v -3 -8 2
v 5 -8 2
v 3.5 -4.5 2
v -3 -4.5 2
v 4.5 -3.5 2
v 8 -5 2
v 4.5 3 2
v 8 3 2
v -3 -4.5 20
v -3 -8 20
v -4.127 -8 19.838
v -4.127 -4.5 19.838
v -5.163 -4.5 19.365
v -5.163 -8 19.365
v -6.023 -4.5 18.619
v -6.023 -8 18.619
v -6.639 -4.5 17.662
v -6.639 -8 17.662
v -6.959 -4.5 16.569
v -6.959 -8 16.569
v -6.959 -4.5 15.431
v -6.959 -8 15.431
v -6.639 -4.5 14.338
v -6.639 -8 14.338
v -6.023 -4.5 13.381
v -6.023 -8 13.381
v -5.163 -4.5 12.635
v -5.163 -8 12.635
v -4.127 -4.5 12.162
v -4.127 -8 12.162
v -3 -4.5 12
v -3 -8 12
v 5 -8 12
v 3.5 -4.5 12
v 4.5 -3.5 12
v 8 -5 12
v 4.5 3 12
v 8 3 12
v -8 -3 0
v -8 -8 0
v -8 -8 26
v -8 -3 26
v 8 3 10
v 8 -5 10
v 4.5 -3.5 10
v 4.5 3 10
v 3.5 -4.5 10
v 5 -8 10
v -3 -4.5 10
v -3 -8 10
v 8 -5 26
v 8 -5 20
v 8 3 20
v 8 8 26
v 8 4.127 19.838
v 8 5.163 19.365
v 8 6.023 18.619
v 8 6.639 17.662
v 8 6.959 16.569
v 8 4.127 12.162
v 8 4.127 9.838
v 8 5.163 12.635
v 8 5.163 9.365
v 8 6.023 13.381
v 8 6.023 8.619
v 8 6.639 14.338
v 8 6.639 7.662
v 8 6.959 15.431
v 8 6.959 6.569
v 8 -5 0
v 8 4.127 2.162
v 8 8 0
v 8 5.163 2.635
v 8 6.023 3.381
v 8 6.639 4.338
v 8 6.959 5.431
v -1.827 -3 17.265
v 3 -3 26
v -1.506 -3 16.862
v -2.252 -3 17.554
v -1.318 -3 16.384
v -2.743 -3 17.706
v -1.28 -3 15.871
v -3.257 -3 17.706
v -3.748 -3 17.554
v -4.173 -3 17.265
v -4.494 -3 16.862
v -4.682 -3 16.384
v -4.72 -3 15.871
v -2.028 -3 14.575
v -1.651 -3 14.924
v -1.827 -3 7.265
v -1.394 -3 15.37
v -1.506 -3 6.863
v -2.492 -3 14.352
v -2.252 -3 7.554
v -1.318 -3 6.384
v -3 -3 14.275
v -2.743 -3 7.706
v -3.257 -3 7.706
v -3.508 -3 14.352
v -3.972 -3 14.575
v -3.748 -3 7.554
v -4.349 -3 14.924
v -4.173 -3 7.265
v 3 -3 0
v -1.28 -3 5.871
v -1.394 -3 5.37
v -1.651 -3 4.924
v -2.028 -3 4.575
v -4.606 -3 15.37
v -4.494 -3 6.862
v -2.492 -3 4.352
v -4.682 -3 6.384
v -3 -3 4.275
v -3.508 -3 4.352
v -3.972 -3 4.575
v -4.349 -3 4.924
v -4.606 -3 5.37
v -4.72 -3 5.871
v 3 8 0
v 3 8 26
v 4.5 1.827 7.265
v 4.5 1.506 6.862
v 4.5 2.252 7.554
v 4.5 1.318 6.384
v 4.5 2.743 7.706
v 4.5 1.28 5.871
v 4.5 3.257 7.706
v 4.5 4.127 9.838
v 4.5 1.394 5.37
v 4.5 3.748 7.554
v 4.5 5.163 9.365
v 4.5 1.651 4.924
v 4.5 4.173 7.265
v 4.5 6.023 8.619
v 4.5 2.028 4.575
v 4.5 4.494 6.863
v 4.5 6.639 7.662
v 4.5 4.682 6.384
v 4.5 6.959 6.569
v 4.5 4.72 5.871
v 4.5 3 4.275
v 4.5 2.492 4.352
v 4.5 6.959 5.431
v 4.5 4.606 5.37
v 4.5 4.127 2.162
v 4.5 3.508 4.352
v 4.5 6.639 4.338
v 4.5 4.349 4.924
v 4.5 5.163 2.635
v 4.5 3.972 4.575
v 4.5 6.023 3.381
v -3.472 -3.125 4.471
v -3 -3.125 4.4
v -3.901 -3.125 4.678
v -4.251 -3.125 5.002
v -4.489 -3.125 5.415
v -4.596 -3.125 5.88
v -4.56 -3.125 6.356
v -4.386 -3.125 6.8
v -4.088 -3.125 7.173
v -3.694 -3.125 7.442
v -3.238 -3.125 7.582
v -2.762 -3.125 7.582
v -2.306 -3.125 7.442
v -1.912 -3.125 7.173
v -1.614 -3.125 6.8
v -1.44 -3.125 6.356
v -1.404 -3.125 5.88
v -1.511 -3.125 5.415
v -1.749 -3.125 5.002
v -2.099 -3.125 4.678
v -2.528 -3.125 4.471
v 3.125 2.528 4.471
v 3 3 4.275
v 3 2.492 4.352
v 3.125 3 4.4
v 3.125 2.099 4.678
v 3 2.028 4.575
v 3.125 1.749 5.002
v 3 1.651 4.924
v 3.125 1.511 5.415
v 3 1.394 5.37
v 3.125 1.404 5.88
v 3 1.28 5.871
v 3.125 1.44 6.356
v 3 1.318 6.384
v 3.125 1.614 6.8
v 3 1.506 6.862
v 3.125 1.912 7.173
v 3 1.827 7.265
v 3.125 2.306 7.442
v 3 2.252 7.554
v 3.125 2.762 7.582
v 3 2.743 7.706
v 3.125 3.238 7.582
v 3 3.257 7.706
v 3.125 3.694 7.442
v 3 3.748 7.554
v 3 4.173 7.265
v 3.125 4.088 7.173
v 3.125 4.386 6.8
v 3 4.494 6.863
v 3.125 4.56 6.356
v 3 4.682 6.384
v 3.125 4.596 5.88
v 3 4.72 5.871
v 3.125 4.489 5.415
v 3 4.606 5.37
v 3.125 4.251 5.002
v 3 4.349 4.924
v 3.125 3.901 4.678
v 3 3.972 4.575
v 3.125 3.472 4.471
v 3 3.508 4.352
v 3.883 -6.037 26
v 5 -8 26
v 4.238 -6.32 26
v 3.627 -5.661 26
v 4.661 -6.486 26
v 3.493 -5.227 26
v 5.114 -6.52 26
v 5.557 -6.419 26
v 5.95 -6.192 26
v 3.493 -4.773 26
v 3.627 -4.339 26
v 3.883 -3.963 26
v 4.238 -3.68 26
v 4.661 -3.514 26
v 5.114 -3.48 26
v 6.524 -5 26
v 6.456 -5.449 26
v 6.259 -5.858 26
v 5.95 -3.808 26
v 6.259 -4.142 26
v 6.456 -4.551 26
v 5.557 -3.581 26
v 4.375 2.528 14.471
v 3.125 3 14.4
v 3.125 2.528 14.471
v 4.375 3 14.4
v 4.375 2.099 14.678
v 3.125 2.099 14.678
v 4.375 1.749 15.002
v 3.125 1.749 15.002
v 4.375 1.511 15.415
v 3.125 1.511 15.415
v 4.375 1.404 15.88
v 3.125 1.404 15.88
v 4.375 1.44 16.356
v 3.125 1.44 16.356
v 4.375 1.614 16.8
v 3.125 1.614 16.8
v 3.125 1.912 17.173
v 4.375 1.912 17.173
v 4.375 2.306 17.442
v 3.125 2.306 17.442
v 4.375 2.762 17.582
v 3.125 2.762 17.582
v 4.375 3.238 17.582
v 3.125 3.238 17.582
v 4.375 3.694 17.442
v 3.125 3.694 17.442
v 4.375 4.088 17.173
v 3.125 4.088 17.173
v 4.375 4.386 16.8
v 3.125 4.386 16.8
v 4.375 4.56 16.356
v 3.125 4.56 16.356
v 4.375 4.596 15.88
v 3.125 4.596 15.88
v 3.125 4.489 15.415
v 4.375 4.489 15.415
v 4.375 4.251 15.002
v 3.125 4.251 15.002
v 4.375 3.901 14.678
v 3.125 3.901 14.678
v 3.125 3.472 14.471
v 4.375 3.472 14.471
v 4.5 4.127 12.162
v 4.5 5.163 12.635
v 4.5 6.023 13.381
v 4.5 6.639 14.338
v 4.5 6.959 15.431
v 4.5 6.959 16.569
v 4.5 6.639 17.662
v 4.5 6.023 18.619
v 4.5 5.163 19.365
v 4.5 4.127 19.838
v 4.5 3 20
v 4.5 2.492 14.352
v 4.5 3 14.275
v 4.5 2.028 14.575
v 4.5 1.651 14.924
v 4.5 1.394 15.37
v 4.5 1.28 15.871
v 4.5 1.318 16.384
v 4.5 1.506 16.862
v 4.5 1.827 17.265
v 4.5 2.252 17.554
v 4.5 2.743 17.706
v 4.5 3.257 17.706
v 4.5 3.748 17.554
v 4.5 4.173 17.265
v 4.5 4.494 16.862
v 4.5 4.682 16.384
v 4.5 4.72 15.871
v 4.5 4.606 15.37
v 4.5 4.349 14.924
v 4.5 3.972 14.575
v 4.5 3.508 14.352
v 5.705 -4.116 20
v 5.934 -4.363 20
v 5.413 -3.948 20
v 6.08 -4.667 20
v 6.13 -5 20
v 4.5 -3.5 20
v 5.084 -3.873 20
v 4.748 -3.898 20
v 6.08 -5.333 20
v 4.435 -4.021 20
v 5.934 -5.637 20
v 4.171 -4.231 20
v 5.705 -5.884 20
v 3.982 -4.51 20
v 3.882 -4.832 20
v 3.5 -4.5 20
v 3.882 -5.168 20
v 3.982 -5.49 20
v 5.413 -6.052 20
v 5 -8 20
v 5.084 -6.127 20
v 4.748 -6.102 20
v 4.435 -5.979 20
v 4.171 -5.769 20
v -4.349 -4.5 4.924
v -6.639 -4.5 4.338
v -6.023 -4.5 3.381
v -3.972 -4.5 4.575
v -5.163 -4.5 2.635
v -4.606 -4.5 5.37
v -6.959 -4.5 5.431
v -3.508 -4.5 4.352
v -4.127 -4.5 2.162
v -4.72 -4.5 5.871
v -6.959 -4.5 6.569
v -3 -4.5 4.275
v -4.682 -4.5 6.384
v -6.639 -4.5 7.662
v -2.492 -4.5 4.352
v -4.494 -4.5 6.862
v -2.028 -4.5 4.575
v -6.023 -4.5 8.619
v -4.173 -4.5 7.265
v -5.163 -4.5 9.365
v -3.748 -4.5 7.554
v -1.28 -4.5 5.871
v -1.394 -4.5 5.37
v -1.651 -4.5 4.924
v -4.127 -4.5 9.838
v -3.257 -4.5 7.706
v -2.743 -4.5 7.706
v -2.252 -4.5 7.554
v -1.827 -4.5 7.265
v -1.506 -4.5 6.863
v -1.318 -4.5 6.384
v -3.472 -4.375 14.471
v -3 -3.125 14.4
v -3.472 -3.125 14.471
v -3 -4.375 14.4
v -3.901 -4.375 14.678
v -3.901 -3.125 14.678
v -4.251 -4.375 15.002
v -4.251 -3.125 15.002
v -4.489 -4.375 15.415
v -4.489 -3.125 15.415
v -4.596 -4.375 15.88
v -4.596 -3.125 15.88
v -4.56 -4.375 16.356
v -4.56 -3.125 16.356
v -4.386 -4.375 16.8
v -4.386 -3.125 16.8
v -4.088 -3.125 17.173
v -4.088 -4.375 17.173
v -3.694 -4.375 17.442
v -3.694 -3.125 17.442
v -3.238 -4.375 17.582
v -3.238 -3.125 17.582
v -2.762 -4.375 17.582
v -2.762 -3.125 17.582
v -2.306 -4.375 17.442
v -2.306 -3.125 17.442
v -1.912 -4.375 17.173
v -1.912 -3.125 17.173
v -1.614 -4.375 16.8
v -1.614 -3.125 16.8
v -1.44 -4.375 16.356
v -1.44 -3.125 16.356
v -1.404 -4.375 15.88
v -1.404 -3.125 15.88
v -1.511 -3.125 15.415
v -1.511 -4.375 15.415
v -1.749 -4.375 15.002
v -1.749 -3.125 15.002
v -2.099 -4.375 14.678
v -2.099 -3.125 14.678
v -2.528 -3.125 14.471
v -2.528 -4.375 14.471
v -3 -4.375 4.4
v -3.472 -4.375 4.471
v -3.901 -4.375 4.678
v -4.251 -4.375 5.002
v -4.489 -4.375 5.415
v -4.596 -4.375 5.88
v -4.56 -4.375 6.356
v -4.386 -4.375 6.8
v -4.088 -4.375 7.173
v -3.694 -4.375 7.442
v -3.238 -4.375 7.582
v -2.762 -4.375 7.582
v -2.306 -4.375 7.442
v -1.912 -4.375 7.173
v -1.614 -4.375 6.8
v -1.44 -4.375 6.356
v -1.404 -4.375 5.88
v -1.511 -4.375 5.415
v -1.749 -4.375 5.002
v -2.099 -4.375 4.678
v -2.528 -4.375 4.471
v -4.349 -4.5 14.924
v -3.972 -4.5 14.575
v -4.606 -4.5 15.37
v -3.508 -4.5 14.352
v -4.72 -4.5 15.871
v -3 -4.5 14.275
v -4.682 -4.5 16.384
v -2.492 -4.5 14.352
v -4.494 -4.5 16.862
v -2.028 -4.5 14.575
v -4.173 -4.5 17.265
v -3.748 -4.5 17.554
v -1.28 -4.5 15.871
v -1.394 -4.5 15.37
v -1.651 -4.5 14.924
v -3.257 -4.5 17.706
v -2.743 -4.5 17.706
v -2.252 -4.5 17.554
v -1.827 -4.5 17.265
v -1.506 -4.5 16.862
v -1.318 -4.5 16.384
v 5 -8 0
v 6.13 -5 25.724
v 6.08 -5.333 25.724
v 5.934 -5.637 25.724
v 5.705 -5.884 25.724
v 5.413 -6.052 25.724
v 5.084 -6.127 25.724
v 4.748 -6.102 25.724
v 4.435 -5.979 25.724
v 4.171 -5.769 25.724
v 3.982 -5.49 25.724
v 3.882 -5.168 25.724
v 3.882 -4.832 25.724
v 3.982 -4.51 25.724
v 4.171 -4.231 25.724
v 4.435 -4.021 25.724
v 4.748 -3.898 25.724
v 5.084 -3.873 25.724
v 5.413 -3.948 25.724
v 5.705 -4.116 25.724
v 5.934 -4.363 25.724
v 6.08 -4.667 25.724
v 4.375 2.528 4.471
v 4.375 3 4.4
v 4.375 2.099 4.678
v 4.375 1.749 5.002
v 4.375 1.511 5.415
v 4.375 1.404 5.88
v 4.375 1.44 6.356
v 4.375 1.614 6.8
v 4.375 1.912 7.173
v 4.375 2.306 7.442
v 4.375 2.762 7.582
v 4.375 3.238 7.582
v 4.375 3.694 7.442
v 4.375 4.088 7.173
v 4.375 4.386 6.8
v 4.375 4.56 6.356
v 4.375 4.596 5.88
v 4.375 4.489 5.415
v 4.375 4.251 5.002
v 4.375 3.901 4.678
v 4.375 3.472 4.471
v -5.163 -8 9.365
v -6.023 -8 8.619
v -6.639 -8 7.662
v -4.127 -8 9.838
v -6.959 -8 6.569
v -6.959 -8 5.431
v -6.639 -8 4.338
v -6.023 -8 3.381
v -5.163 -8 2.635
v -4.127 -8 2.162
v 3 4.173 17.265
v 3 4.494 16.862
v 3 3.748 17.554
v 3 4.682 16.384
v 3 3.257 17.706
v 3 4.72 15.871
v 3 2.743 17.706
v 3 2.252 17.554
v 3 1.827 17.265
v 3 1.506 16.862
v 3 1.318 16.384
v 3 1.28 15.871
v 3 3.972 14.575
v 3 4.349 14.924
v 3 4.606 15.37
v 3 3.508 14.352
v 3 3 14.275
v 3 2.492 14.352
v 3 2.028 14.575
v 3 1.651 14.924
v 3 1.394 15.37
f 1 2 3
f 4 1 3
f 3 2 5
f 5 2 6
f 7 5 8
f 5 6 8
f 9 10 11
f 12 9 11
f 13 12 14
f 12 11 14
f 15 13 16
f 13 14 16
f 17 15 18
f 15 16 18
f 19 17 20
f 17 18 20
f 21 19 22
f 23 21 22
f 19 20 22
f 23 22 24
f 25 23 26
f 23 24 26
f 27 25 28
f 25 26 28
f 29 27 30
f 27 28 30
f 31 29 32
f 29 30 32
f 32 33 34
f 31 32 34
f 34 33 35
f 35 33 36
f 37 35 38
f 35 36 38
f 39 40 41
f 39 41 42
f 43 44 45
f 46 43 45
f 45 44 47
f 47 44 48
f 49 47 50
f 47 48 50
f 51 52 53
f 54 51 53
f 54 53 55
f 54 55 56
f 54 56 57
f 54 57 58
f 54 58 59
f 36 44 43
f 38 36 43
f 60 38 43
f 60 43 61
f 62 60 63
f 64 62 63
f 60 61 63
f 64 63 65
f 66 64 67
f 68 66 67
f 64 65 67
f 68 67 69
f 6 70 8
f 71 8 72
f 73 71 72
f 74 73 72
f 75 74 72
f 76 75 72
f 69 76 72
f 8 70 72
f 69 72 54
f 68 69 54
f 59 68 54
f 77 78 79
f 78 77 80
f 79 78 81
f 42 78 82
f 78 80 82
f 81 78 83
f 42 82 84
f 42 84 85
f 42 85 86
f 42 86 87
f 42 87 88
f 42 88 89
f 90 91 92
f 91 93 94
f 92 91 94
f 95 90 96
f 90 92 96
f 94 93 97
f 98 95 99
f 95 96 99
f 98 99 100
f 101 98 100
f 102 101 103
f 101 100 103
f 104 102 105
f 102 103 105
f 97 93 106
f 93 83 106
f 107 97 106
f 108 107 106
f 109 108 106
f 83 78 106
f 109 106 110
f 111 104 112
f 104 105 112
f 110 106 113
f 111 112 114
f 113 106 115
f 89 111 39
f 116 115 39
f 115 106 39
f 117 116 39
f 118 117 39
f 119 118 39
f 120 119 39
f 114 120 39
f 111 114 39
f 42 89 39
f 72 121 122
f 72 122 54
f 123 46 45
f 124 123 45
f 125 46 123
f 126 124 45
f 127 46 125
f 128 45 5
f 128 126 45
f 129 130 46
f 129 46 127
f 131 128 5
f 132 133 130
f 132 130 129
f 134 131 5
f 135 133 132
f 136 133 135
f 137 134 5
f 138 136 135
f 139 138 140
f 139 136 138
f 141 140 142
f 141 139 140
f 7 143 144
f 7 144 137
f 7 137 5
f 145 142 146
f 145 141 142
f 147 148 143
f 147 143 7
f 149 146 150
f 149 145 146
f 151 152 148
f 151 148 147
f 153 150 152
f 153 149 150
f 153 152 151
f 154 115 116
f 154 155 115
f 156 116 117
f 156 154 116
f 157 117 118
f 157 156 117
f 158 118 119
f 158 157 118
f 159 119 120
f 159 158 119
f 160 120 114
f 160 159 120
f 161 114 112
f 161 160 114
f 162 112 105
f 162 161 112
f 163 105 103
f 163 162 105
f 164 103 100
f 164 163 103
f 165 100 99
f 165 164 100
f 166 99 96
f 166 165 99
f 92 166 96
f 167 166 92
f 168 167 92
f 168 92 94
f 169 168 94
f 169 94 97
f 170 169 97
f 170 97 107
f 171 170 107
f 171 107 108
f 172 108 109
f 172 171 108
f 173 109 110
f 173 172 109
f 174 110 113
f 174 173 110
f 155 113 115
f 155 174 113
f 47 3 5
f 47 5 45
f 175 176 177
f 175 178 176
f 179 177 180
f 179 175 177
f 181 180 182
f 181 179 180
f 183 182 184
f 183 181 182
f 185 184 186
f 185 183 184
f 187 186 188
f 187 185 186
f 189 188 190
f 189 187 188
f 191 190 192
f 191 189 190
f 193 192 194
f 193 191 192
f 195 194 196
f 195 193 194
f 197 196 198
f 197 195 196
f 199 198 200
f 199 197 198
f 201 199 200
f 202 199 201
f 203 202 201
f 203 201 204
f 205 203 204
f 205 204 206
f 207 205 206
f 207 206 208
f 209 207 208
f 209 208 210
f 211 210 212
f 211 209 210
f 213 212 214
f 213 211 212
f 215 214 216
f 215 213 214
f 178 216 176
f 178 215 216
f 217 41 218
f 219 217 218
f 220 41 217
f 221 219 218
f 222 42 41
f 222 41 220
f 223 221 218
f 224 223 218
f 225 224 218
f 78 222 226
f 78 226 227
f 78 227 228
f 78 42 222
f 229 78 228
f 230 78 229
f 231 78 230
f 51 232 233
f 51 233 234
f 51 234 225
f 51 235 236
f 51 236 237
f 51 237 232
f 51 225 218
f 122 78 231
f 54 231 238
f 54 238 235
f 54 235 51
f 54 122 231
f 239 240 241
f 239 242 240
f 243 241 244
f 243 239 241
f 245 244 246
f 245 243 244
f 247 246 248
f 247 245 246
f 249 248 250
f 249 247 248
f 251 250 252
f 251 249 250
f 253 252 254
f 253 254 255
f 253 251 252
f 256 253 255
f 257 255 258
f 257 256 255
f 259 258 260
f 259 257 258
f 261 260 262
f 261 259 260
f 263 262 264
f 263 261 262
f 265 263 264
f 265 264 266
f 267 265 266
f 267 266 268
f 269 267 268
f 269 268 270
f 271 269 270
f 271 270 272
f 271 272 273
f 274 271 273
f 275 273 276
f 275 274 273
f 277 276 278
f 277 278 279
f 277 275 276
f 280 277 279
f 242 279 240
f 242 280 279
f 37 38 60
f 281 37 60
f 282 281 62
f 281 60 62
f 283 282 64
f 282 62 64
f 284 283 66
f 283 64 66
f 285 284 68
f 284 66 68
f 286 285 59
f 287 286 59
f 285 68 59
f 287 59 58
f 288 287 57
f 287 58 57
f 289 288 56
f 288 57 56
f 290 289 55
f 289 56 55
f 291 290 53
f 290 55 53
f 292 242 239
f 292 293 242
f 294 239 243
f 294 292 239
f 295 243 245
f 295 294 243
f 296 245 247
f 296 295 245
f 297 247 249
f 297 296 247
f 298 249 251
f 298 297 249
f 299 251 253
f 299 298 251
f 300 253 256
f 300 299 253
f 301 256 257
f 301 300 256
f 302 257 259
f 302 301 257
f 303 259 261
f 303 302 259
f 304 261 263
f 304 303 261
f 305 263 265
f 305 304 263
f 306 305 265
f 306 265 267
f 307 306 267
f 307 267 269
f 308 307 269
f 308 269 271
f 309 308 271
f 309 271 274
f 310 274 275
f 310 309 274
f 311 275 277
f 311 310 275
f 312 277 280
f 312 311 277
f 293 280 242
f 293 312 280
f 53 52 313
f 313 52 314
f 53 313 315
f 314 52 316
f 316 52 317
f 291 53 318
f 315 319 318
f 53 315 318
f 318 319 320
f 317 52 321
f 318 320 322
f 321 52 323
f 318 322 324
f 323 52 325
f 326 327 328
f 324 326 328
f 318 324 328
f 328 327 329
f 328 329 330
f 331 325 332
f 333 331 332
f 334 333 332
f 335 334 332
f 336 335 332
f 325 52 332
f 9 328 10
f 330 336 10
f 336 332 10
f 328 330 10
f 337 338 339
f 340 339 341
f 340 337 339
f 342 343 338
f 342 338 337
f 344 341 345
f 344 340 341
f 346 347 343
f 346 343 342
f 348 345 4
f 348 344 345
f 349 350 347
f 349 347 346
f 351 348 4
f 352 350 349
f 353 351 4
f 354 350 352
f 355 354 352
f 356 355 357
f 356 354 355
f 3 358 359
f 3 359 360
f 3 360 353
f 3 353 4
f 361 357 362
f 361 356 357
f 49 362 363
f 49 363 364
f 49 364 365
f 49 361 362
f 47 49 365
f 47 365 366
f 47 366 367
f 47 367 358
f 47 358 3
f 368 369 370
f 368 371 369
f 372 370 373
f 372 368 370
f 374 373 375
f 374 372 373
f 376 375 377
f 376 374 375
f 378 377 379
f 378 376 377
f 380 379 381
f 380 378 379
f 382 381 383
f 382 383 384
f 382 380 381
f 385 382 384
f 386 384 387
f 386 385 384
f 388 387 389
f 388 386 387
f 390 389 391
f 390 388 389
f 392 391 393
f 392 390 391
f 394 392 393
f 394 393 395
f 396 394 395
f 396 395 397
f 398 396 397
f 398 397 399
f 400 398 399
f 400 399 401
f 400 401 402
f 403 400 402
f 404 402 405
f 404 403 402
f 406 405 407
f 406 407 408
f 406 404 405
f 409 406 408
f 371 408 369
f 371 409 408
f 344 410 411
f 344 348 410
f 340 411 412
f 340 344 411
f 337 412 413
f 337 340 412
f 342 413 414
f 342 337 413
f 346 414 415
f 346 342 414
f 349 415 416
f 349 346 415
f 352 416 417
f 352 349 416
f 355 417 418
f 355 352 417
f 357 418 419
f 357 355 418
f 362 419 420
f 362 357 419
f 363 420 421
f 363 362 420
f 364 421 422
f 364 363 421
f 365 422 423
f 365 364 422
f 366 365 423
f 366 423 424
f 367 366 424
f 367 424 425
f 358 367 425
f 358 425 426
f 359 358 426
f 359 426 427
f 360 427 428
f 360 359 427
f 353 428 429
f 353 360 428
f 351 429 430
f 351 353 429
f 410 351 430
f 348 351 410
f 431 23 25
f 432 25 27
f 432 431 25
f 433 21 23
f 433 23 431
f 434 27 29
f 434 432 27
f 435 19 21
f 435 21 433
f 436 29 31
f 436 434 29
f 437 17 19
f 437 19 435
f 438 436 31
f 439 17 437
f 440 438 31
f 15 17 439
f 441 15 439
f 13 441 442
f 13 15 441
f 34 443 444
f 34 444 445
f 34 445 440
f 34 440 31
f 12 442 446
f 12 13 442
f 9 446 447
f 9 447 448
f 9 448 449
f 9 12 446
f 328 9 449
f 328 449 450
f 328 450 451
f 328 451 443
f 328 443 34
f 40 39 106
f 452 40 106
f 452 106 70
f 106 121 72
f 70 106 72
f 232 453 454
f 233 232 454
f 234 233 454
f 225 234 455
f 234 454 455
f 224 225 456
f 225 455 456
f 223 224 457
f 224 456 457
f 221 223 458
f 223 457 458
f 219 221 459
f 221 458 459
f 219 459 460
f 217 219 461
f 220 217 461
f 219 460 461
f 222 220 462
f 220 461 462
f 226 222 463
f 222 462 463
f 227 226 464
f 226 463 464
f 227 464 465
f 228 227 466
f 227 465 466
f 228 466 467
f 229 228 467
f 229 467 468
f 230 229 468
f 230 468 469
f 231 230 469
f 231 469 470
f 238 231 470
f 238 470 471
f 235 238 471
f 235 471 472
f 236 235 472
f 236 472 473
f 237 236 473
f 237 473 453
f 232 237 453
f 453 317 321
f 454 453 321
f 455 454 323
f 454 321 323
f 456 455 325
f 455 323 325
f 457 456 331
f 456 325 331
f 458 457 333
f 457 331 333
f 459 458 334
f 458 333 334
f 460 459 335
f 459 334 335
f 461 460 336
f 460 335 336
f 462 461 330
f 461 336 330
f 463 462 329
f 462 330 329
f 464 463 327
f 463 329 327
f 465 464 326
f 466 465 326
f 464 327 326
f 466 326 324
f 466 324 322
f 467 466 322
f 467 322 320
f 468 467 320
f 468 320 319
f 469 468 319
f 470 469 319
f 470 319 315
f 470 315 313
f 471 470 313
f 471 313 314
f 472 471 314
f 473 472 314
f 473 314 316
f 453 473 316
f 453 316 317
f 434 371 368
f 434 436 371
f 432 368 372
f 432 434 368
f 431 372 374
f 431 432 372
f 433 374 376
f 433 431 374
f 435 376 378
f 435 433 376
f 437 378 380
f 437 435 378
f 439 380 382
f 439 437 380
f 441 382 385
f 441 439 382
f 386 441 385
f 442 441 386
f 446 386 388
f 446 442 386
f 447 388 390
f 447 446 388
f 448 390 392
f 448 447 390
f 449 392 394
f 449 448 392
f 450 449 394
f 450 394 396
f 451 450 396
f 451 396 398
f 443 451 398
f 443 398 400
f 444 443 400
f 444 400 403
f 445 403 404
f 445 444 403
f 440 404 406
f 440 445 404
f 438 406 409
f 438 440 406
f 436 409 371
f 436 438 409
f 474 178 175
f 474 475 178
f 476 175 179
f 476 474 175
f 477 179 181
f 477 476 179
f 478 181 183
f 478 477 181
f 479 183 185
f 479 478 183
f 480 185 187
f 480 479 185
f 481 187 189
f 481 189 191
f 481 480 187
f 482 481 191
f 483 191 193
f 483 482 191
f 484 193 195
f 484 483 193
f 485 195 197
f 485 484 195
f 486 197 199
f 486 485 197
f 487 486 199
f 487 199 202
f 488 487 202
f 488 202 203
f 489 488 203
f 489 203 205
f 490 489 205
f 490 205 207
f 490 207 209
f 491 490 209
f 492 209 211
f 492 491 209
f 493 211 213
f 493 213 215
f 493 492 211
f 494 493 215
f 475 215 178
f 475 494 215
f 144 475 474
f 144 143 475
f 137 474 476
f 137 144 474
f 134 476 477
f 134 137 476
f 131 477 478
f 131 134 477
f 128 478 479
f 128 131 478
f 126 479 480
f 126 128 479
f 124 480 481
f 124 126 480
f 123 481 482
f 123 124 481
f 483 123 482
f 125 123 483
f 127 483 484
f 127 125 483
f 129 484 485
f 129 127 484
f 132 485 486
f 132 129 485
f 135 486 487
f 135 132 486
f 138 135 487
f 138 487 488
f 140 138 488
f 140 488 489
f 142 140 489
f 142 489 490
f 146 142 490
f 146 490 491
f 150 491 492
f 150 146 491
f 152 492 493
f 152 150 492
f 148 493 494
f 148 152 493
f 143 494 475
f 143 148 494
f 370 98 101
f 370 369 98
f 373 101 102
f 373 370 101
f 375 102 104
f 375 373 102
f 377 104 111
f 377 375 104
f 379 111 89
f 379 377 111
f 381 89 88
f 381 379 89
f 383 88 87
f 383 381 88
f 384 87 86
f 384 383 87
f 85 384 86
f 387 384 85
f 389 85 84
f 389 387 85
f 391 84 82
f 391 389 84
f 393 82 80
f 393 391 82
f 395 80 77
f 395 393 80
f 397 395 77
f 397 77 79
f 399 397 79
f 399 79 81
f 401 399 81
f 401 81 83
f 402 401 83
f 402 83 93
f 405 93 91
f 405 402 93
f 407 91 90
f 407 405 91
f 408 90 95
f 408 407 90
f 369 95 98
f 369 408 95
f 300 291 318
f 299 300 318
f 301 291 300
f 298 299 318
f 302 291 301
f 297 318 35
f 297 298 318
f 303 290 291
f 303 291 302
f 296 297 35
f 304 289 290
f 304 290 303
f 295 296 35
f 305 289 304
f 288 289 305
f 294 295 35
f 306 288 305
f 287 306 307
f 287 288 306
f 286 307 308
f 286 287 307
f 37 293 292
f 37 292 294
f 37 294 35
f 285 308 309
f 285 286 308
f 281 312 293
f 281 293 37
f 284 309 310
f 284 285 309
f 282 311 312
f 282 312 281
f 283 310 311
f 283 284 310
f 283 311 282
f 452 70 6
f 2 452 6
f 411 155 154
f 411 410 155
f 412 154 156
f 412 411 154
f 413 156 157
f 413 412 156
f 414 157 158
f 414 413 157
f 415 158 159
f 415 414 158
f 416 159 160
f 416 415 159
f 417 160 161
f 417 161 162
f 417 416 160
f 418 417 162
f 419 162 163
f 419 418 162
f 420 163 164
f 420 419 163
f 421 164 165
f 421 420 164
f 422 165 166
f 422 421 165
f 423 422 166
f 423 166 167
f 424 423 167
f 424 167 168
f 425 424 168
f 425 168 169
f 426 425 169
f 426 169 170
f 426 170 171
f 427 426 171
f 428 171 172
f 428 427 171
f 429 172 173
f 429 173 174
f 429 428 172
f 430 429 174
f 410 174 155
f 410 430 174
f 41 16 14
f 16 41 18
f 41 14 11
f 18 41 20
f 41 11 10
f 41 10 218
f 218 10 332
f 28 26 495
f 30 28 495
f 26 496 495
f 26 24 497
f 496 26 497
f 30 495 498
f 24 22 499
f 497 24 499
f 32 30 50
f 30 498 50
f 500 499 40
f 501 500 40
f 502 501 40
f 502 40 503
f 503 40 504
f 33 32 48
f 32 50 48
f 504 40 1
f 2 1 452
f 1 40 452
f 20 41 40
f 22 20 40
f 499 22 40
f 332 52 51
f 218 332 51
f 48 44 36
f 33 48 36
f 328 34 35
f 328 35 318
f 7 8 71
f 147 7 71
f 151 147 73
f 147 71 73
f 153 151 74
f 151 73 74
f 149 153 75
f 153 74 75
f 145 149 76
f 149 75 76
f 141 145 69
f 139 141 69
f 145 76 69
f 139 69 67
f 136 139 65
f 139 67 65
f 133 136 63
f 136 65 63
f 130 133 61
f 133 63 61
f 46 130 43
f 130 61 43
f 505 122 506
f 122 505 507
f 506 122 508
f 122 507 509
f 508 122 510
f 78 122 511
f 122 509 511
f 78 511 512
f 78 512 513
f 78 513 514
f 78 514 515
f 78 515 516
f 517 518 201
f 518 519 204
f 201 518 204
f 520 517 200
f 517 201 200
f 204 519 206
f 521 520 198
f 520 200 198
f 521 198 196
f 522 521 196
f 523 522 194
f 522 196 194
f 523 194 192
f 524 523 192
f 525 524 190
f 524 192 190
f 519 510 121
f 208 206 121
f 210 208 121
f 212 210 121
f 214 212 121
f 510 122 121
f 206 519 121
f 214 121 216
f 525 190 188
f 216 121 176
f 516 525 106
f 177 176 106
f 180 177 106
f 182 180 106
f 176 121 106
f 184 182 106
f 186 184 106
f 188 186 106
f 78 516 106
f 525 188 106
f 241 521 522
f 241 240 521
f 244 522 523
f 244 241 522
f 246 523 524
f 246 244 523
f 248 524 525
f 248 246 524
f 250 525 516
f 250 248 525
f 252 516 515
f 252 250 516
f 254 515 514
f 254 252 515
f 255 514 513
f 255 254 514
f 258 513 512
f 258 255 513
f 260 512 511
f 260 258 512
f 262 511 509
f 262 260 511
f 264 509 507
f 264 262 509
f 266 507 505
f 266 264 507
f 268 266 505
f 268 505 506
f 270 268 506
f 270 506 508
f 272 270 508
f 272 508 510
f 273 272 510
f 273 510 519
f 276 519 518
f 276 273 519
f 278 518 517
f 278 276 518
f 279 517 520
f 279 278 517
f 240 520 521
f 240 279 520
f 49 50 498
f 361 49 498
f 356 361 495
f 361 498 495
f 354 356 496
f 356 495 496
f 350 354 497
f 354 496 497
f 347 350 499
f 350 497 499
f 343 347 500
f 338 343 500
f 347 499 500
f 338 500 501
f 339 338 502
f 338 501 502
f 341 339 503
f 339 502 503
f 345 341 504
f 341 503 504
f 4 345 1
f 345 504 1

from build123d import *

# Parameters (mm, degrees)
SKETCH_1_W                    = 16
SKETCH_1_H                    = 16
EXTRUDE_1_DEPTH               = 26
CUT_EXTRUDE_1_DEPTH           = 29.354893758
CUT_EXTRUDE_2_DEPTH           = 3.5
CUT_EXTRUDE_3_DEPTH           = 3.5
CHAMFER_1_SIZE                = 1
HOLE_WIZARD_4_401_D           = 2.2606
HOLE_WIZARD_4_401_DEPTH       = 6
HOLE_WIZARD_4_401_CSINK_D     = 3.048
HOLE_WIZARD_4_401_CSINK_ANGLE = 110
CHAMFER_3_SIZE                = 3


with BuildPart() as part:
    # Эскиз1 → Вытянуть1 (new body)
    with BuildSketch(Plane.XY):
        Rectangle(SKETCH_1_W, SKETCH_1_H)
    extrude(amount=EXTRUDE_1_DEPTH)

    # Эскиз2 → Вырез-Вытянуть1 (cut, through all)
    with BuildSketch(Plane(origin=(0, 0, 0), x_dir=(-1, 0, 0), z_dir=(0, 0, -1))):
        Polygon((-3, 56.832975678), (-3, 8), (-3, -3), (8, -3), (56.832975678, -3), (125.893232173, 66.060256495), (66.060256495, 125.893232173), align=None)
    extrude(amount=-CUT_EXTRUDE_1_DEPTH, mode=Mode.SUBTRACT)

    # Эскиз9 → Вырез-Вытянуть2 (cut)
    with BuildSketch(Plane(origin=(8, 0, 0), x_dir=(0, 0, -1), z_dir=(1, 0, 0))):
        with BuildLine():
            Line((-20, 3), (-20, -8))
            Line((-20, -8), (-12, -8))
            Line((-12, -8), (-12, 3))
            ThreePointArc((-12, 3), (-16, 7), (-20, 3))
        make_face()
        with BuildLine():
            Line((-10, 3), (-10, -8))
            Line((-10, -8), (-2, -8))
            Line((-2, -8), (-2, 3))
            ThreePointArc((-2, 3), (-6, 7), (-10, 3))
        make_face()
    extrude(amount=-CUT_EXTRUDE_2_DEPTH, mode=Mode.SUBTRACT)

    # Эскиз10 → Вырез-Вытянуть3 (cut)
    with BuildSketch(Plane.XZ.offset(8)):
        with BuildLine():
            Line((4.5, 20), (-3, 20))
            ThreePointArc((-3, 20), (-7, 16), (-3, 12))
            Line((-3, 12), (4.5, 12))
            Line((4.5, 12), (4.5, 20))
        make_face()
        with BuildLine():
            Line((4.5, 10), (-3, 10))
            ThreePointArc((-3, 10), (-7, 6), (-3, 2))
            Line((-3, 2), (4.5, 2))
            Line((4.5, 2), (4.5, 10))
        make_face()
    extrude(amount=-CUT_EXTRUDE_3_DEPTH, mode=Mode.SUBTRACT)

    # Фаска1
    chamfer_1_edges = [part.edges().sort_by_distance(p)[0] for p in [
        (4.5, -4.5, 16),
        (4.5, -4.5, 6),
    ]]
    chamfer(chamfer_1_edges, length=CHAMFER_1_SIZE)

    # Отверстие обработанное метчиком #4-401
    with Locations(Plane(origin=(-3.054370164, -0.984217205, 26), x_dir=(-1, 0, 0), z_dir=(0, 0, 1))):
        with Locations((-8.054370164, 4.015782795)):
            CounterSinkHole(HOLE_WIZARD_4_401_D / 2, HOLE_WIZARD_4_401_CSINK_D / 2, depth=HOLE_WIZARD_4_401_DEPTH, counter_sink_angle=HOLE_WIZARD_4_401_CSINK_ANGLE)

    # Эскиз11 → Отверстие с зазором M31 (revolve, cut)
    with BuildSketch(Plane(origin=(-3, -4.5, 16), x_dir=(0, 0, -1), z_dir=(1, 0, 0))):
        Polygon((0, 0), (0, 1.5), (1.725, 1.5), (1.6, 1.375), (1.6, 0.125), (1.725, 0), align=None)
    revolve(axis=Axis((-3, -10.85, 16), (0, 1, 0)), mode=Mode.SUBTRACT)

    # Эскиз11 at point 2 (carried to point 2, square into its face) → Отверстие с зазором M31 at 2 (revolve, cut)
    with BuildSketch(Plane(origin=(-3, -4.5, 6), x_dir=(0, 0, -1), z_dir=(1, 0, 0))):
        Polygon((0, 0), (0, 1.5), (1.725, 1.5), (1.6, 1.375), (1.6, 0.125), (1.725, 0), align=None)
    revolve(axis=Axis((-3, -10.85, 6), (0, 1, 0)), mode=Mode.SUBTRACT)

    # Эскиз11 at point 3 (carried to point 3, square into its face) → Отверстие с зазором M31 at 3 (revolve, cut)
    with BuildSketch(Plane(origin=(4.5, 3, 6), x_dir=(0, 0, -1), z_dir=(0, 1, 0))):
        Polygon((0, 0), (0, 1.5), (1.725, 1.5), (1.6, 1.375), (1.6, 0.125), (1.725, 0), align=None)
    revolve(axis=Axis((10.85, 3, 6), (-1, 0, 0)), mode=Mode.SUBTRACT)

    # Эскиз11 at point 4 (carried to point 4, square into its face) → Отверстие с зазором M31 at 4 (revolve, cut)
    with BuildSketch(Plane(origin=(4.5, 3, 16), x_dir=(0, 0, -1), z_dir=(0, 1, 0))):
        Polygon((0, 0), (0, 1.5), (1.725, 1.5), (1.6, 1.375), (1.6, 0.125), (1.725, 0), align=None)
    revolve(axis=Axis((10.85, 3, 16), (-1, 0, 0)), mode=Mode.SUBTRACT)

    # Фаска3
    chamfer_3_edges = [part.edges().sort_by_distance(p)[0] for p in [
        (8, -8, 11),
        (8, -8, 1),
        (8, -8, 23),
    ]]
    chamfer(chamfer_3_edges, length=CHAMFER_3_SIZE)


solid = part.part
